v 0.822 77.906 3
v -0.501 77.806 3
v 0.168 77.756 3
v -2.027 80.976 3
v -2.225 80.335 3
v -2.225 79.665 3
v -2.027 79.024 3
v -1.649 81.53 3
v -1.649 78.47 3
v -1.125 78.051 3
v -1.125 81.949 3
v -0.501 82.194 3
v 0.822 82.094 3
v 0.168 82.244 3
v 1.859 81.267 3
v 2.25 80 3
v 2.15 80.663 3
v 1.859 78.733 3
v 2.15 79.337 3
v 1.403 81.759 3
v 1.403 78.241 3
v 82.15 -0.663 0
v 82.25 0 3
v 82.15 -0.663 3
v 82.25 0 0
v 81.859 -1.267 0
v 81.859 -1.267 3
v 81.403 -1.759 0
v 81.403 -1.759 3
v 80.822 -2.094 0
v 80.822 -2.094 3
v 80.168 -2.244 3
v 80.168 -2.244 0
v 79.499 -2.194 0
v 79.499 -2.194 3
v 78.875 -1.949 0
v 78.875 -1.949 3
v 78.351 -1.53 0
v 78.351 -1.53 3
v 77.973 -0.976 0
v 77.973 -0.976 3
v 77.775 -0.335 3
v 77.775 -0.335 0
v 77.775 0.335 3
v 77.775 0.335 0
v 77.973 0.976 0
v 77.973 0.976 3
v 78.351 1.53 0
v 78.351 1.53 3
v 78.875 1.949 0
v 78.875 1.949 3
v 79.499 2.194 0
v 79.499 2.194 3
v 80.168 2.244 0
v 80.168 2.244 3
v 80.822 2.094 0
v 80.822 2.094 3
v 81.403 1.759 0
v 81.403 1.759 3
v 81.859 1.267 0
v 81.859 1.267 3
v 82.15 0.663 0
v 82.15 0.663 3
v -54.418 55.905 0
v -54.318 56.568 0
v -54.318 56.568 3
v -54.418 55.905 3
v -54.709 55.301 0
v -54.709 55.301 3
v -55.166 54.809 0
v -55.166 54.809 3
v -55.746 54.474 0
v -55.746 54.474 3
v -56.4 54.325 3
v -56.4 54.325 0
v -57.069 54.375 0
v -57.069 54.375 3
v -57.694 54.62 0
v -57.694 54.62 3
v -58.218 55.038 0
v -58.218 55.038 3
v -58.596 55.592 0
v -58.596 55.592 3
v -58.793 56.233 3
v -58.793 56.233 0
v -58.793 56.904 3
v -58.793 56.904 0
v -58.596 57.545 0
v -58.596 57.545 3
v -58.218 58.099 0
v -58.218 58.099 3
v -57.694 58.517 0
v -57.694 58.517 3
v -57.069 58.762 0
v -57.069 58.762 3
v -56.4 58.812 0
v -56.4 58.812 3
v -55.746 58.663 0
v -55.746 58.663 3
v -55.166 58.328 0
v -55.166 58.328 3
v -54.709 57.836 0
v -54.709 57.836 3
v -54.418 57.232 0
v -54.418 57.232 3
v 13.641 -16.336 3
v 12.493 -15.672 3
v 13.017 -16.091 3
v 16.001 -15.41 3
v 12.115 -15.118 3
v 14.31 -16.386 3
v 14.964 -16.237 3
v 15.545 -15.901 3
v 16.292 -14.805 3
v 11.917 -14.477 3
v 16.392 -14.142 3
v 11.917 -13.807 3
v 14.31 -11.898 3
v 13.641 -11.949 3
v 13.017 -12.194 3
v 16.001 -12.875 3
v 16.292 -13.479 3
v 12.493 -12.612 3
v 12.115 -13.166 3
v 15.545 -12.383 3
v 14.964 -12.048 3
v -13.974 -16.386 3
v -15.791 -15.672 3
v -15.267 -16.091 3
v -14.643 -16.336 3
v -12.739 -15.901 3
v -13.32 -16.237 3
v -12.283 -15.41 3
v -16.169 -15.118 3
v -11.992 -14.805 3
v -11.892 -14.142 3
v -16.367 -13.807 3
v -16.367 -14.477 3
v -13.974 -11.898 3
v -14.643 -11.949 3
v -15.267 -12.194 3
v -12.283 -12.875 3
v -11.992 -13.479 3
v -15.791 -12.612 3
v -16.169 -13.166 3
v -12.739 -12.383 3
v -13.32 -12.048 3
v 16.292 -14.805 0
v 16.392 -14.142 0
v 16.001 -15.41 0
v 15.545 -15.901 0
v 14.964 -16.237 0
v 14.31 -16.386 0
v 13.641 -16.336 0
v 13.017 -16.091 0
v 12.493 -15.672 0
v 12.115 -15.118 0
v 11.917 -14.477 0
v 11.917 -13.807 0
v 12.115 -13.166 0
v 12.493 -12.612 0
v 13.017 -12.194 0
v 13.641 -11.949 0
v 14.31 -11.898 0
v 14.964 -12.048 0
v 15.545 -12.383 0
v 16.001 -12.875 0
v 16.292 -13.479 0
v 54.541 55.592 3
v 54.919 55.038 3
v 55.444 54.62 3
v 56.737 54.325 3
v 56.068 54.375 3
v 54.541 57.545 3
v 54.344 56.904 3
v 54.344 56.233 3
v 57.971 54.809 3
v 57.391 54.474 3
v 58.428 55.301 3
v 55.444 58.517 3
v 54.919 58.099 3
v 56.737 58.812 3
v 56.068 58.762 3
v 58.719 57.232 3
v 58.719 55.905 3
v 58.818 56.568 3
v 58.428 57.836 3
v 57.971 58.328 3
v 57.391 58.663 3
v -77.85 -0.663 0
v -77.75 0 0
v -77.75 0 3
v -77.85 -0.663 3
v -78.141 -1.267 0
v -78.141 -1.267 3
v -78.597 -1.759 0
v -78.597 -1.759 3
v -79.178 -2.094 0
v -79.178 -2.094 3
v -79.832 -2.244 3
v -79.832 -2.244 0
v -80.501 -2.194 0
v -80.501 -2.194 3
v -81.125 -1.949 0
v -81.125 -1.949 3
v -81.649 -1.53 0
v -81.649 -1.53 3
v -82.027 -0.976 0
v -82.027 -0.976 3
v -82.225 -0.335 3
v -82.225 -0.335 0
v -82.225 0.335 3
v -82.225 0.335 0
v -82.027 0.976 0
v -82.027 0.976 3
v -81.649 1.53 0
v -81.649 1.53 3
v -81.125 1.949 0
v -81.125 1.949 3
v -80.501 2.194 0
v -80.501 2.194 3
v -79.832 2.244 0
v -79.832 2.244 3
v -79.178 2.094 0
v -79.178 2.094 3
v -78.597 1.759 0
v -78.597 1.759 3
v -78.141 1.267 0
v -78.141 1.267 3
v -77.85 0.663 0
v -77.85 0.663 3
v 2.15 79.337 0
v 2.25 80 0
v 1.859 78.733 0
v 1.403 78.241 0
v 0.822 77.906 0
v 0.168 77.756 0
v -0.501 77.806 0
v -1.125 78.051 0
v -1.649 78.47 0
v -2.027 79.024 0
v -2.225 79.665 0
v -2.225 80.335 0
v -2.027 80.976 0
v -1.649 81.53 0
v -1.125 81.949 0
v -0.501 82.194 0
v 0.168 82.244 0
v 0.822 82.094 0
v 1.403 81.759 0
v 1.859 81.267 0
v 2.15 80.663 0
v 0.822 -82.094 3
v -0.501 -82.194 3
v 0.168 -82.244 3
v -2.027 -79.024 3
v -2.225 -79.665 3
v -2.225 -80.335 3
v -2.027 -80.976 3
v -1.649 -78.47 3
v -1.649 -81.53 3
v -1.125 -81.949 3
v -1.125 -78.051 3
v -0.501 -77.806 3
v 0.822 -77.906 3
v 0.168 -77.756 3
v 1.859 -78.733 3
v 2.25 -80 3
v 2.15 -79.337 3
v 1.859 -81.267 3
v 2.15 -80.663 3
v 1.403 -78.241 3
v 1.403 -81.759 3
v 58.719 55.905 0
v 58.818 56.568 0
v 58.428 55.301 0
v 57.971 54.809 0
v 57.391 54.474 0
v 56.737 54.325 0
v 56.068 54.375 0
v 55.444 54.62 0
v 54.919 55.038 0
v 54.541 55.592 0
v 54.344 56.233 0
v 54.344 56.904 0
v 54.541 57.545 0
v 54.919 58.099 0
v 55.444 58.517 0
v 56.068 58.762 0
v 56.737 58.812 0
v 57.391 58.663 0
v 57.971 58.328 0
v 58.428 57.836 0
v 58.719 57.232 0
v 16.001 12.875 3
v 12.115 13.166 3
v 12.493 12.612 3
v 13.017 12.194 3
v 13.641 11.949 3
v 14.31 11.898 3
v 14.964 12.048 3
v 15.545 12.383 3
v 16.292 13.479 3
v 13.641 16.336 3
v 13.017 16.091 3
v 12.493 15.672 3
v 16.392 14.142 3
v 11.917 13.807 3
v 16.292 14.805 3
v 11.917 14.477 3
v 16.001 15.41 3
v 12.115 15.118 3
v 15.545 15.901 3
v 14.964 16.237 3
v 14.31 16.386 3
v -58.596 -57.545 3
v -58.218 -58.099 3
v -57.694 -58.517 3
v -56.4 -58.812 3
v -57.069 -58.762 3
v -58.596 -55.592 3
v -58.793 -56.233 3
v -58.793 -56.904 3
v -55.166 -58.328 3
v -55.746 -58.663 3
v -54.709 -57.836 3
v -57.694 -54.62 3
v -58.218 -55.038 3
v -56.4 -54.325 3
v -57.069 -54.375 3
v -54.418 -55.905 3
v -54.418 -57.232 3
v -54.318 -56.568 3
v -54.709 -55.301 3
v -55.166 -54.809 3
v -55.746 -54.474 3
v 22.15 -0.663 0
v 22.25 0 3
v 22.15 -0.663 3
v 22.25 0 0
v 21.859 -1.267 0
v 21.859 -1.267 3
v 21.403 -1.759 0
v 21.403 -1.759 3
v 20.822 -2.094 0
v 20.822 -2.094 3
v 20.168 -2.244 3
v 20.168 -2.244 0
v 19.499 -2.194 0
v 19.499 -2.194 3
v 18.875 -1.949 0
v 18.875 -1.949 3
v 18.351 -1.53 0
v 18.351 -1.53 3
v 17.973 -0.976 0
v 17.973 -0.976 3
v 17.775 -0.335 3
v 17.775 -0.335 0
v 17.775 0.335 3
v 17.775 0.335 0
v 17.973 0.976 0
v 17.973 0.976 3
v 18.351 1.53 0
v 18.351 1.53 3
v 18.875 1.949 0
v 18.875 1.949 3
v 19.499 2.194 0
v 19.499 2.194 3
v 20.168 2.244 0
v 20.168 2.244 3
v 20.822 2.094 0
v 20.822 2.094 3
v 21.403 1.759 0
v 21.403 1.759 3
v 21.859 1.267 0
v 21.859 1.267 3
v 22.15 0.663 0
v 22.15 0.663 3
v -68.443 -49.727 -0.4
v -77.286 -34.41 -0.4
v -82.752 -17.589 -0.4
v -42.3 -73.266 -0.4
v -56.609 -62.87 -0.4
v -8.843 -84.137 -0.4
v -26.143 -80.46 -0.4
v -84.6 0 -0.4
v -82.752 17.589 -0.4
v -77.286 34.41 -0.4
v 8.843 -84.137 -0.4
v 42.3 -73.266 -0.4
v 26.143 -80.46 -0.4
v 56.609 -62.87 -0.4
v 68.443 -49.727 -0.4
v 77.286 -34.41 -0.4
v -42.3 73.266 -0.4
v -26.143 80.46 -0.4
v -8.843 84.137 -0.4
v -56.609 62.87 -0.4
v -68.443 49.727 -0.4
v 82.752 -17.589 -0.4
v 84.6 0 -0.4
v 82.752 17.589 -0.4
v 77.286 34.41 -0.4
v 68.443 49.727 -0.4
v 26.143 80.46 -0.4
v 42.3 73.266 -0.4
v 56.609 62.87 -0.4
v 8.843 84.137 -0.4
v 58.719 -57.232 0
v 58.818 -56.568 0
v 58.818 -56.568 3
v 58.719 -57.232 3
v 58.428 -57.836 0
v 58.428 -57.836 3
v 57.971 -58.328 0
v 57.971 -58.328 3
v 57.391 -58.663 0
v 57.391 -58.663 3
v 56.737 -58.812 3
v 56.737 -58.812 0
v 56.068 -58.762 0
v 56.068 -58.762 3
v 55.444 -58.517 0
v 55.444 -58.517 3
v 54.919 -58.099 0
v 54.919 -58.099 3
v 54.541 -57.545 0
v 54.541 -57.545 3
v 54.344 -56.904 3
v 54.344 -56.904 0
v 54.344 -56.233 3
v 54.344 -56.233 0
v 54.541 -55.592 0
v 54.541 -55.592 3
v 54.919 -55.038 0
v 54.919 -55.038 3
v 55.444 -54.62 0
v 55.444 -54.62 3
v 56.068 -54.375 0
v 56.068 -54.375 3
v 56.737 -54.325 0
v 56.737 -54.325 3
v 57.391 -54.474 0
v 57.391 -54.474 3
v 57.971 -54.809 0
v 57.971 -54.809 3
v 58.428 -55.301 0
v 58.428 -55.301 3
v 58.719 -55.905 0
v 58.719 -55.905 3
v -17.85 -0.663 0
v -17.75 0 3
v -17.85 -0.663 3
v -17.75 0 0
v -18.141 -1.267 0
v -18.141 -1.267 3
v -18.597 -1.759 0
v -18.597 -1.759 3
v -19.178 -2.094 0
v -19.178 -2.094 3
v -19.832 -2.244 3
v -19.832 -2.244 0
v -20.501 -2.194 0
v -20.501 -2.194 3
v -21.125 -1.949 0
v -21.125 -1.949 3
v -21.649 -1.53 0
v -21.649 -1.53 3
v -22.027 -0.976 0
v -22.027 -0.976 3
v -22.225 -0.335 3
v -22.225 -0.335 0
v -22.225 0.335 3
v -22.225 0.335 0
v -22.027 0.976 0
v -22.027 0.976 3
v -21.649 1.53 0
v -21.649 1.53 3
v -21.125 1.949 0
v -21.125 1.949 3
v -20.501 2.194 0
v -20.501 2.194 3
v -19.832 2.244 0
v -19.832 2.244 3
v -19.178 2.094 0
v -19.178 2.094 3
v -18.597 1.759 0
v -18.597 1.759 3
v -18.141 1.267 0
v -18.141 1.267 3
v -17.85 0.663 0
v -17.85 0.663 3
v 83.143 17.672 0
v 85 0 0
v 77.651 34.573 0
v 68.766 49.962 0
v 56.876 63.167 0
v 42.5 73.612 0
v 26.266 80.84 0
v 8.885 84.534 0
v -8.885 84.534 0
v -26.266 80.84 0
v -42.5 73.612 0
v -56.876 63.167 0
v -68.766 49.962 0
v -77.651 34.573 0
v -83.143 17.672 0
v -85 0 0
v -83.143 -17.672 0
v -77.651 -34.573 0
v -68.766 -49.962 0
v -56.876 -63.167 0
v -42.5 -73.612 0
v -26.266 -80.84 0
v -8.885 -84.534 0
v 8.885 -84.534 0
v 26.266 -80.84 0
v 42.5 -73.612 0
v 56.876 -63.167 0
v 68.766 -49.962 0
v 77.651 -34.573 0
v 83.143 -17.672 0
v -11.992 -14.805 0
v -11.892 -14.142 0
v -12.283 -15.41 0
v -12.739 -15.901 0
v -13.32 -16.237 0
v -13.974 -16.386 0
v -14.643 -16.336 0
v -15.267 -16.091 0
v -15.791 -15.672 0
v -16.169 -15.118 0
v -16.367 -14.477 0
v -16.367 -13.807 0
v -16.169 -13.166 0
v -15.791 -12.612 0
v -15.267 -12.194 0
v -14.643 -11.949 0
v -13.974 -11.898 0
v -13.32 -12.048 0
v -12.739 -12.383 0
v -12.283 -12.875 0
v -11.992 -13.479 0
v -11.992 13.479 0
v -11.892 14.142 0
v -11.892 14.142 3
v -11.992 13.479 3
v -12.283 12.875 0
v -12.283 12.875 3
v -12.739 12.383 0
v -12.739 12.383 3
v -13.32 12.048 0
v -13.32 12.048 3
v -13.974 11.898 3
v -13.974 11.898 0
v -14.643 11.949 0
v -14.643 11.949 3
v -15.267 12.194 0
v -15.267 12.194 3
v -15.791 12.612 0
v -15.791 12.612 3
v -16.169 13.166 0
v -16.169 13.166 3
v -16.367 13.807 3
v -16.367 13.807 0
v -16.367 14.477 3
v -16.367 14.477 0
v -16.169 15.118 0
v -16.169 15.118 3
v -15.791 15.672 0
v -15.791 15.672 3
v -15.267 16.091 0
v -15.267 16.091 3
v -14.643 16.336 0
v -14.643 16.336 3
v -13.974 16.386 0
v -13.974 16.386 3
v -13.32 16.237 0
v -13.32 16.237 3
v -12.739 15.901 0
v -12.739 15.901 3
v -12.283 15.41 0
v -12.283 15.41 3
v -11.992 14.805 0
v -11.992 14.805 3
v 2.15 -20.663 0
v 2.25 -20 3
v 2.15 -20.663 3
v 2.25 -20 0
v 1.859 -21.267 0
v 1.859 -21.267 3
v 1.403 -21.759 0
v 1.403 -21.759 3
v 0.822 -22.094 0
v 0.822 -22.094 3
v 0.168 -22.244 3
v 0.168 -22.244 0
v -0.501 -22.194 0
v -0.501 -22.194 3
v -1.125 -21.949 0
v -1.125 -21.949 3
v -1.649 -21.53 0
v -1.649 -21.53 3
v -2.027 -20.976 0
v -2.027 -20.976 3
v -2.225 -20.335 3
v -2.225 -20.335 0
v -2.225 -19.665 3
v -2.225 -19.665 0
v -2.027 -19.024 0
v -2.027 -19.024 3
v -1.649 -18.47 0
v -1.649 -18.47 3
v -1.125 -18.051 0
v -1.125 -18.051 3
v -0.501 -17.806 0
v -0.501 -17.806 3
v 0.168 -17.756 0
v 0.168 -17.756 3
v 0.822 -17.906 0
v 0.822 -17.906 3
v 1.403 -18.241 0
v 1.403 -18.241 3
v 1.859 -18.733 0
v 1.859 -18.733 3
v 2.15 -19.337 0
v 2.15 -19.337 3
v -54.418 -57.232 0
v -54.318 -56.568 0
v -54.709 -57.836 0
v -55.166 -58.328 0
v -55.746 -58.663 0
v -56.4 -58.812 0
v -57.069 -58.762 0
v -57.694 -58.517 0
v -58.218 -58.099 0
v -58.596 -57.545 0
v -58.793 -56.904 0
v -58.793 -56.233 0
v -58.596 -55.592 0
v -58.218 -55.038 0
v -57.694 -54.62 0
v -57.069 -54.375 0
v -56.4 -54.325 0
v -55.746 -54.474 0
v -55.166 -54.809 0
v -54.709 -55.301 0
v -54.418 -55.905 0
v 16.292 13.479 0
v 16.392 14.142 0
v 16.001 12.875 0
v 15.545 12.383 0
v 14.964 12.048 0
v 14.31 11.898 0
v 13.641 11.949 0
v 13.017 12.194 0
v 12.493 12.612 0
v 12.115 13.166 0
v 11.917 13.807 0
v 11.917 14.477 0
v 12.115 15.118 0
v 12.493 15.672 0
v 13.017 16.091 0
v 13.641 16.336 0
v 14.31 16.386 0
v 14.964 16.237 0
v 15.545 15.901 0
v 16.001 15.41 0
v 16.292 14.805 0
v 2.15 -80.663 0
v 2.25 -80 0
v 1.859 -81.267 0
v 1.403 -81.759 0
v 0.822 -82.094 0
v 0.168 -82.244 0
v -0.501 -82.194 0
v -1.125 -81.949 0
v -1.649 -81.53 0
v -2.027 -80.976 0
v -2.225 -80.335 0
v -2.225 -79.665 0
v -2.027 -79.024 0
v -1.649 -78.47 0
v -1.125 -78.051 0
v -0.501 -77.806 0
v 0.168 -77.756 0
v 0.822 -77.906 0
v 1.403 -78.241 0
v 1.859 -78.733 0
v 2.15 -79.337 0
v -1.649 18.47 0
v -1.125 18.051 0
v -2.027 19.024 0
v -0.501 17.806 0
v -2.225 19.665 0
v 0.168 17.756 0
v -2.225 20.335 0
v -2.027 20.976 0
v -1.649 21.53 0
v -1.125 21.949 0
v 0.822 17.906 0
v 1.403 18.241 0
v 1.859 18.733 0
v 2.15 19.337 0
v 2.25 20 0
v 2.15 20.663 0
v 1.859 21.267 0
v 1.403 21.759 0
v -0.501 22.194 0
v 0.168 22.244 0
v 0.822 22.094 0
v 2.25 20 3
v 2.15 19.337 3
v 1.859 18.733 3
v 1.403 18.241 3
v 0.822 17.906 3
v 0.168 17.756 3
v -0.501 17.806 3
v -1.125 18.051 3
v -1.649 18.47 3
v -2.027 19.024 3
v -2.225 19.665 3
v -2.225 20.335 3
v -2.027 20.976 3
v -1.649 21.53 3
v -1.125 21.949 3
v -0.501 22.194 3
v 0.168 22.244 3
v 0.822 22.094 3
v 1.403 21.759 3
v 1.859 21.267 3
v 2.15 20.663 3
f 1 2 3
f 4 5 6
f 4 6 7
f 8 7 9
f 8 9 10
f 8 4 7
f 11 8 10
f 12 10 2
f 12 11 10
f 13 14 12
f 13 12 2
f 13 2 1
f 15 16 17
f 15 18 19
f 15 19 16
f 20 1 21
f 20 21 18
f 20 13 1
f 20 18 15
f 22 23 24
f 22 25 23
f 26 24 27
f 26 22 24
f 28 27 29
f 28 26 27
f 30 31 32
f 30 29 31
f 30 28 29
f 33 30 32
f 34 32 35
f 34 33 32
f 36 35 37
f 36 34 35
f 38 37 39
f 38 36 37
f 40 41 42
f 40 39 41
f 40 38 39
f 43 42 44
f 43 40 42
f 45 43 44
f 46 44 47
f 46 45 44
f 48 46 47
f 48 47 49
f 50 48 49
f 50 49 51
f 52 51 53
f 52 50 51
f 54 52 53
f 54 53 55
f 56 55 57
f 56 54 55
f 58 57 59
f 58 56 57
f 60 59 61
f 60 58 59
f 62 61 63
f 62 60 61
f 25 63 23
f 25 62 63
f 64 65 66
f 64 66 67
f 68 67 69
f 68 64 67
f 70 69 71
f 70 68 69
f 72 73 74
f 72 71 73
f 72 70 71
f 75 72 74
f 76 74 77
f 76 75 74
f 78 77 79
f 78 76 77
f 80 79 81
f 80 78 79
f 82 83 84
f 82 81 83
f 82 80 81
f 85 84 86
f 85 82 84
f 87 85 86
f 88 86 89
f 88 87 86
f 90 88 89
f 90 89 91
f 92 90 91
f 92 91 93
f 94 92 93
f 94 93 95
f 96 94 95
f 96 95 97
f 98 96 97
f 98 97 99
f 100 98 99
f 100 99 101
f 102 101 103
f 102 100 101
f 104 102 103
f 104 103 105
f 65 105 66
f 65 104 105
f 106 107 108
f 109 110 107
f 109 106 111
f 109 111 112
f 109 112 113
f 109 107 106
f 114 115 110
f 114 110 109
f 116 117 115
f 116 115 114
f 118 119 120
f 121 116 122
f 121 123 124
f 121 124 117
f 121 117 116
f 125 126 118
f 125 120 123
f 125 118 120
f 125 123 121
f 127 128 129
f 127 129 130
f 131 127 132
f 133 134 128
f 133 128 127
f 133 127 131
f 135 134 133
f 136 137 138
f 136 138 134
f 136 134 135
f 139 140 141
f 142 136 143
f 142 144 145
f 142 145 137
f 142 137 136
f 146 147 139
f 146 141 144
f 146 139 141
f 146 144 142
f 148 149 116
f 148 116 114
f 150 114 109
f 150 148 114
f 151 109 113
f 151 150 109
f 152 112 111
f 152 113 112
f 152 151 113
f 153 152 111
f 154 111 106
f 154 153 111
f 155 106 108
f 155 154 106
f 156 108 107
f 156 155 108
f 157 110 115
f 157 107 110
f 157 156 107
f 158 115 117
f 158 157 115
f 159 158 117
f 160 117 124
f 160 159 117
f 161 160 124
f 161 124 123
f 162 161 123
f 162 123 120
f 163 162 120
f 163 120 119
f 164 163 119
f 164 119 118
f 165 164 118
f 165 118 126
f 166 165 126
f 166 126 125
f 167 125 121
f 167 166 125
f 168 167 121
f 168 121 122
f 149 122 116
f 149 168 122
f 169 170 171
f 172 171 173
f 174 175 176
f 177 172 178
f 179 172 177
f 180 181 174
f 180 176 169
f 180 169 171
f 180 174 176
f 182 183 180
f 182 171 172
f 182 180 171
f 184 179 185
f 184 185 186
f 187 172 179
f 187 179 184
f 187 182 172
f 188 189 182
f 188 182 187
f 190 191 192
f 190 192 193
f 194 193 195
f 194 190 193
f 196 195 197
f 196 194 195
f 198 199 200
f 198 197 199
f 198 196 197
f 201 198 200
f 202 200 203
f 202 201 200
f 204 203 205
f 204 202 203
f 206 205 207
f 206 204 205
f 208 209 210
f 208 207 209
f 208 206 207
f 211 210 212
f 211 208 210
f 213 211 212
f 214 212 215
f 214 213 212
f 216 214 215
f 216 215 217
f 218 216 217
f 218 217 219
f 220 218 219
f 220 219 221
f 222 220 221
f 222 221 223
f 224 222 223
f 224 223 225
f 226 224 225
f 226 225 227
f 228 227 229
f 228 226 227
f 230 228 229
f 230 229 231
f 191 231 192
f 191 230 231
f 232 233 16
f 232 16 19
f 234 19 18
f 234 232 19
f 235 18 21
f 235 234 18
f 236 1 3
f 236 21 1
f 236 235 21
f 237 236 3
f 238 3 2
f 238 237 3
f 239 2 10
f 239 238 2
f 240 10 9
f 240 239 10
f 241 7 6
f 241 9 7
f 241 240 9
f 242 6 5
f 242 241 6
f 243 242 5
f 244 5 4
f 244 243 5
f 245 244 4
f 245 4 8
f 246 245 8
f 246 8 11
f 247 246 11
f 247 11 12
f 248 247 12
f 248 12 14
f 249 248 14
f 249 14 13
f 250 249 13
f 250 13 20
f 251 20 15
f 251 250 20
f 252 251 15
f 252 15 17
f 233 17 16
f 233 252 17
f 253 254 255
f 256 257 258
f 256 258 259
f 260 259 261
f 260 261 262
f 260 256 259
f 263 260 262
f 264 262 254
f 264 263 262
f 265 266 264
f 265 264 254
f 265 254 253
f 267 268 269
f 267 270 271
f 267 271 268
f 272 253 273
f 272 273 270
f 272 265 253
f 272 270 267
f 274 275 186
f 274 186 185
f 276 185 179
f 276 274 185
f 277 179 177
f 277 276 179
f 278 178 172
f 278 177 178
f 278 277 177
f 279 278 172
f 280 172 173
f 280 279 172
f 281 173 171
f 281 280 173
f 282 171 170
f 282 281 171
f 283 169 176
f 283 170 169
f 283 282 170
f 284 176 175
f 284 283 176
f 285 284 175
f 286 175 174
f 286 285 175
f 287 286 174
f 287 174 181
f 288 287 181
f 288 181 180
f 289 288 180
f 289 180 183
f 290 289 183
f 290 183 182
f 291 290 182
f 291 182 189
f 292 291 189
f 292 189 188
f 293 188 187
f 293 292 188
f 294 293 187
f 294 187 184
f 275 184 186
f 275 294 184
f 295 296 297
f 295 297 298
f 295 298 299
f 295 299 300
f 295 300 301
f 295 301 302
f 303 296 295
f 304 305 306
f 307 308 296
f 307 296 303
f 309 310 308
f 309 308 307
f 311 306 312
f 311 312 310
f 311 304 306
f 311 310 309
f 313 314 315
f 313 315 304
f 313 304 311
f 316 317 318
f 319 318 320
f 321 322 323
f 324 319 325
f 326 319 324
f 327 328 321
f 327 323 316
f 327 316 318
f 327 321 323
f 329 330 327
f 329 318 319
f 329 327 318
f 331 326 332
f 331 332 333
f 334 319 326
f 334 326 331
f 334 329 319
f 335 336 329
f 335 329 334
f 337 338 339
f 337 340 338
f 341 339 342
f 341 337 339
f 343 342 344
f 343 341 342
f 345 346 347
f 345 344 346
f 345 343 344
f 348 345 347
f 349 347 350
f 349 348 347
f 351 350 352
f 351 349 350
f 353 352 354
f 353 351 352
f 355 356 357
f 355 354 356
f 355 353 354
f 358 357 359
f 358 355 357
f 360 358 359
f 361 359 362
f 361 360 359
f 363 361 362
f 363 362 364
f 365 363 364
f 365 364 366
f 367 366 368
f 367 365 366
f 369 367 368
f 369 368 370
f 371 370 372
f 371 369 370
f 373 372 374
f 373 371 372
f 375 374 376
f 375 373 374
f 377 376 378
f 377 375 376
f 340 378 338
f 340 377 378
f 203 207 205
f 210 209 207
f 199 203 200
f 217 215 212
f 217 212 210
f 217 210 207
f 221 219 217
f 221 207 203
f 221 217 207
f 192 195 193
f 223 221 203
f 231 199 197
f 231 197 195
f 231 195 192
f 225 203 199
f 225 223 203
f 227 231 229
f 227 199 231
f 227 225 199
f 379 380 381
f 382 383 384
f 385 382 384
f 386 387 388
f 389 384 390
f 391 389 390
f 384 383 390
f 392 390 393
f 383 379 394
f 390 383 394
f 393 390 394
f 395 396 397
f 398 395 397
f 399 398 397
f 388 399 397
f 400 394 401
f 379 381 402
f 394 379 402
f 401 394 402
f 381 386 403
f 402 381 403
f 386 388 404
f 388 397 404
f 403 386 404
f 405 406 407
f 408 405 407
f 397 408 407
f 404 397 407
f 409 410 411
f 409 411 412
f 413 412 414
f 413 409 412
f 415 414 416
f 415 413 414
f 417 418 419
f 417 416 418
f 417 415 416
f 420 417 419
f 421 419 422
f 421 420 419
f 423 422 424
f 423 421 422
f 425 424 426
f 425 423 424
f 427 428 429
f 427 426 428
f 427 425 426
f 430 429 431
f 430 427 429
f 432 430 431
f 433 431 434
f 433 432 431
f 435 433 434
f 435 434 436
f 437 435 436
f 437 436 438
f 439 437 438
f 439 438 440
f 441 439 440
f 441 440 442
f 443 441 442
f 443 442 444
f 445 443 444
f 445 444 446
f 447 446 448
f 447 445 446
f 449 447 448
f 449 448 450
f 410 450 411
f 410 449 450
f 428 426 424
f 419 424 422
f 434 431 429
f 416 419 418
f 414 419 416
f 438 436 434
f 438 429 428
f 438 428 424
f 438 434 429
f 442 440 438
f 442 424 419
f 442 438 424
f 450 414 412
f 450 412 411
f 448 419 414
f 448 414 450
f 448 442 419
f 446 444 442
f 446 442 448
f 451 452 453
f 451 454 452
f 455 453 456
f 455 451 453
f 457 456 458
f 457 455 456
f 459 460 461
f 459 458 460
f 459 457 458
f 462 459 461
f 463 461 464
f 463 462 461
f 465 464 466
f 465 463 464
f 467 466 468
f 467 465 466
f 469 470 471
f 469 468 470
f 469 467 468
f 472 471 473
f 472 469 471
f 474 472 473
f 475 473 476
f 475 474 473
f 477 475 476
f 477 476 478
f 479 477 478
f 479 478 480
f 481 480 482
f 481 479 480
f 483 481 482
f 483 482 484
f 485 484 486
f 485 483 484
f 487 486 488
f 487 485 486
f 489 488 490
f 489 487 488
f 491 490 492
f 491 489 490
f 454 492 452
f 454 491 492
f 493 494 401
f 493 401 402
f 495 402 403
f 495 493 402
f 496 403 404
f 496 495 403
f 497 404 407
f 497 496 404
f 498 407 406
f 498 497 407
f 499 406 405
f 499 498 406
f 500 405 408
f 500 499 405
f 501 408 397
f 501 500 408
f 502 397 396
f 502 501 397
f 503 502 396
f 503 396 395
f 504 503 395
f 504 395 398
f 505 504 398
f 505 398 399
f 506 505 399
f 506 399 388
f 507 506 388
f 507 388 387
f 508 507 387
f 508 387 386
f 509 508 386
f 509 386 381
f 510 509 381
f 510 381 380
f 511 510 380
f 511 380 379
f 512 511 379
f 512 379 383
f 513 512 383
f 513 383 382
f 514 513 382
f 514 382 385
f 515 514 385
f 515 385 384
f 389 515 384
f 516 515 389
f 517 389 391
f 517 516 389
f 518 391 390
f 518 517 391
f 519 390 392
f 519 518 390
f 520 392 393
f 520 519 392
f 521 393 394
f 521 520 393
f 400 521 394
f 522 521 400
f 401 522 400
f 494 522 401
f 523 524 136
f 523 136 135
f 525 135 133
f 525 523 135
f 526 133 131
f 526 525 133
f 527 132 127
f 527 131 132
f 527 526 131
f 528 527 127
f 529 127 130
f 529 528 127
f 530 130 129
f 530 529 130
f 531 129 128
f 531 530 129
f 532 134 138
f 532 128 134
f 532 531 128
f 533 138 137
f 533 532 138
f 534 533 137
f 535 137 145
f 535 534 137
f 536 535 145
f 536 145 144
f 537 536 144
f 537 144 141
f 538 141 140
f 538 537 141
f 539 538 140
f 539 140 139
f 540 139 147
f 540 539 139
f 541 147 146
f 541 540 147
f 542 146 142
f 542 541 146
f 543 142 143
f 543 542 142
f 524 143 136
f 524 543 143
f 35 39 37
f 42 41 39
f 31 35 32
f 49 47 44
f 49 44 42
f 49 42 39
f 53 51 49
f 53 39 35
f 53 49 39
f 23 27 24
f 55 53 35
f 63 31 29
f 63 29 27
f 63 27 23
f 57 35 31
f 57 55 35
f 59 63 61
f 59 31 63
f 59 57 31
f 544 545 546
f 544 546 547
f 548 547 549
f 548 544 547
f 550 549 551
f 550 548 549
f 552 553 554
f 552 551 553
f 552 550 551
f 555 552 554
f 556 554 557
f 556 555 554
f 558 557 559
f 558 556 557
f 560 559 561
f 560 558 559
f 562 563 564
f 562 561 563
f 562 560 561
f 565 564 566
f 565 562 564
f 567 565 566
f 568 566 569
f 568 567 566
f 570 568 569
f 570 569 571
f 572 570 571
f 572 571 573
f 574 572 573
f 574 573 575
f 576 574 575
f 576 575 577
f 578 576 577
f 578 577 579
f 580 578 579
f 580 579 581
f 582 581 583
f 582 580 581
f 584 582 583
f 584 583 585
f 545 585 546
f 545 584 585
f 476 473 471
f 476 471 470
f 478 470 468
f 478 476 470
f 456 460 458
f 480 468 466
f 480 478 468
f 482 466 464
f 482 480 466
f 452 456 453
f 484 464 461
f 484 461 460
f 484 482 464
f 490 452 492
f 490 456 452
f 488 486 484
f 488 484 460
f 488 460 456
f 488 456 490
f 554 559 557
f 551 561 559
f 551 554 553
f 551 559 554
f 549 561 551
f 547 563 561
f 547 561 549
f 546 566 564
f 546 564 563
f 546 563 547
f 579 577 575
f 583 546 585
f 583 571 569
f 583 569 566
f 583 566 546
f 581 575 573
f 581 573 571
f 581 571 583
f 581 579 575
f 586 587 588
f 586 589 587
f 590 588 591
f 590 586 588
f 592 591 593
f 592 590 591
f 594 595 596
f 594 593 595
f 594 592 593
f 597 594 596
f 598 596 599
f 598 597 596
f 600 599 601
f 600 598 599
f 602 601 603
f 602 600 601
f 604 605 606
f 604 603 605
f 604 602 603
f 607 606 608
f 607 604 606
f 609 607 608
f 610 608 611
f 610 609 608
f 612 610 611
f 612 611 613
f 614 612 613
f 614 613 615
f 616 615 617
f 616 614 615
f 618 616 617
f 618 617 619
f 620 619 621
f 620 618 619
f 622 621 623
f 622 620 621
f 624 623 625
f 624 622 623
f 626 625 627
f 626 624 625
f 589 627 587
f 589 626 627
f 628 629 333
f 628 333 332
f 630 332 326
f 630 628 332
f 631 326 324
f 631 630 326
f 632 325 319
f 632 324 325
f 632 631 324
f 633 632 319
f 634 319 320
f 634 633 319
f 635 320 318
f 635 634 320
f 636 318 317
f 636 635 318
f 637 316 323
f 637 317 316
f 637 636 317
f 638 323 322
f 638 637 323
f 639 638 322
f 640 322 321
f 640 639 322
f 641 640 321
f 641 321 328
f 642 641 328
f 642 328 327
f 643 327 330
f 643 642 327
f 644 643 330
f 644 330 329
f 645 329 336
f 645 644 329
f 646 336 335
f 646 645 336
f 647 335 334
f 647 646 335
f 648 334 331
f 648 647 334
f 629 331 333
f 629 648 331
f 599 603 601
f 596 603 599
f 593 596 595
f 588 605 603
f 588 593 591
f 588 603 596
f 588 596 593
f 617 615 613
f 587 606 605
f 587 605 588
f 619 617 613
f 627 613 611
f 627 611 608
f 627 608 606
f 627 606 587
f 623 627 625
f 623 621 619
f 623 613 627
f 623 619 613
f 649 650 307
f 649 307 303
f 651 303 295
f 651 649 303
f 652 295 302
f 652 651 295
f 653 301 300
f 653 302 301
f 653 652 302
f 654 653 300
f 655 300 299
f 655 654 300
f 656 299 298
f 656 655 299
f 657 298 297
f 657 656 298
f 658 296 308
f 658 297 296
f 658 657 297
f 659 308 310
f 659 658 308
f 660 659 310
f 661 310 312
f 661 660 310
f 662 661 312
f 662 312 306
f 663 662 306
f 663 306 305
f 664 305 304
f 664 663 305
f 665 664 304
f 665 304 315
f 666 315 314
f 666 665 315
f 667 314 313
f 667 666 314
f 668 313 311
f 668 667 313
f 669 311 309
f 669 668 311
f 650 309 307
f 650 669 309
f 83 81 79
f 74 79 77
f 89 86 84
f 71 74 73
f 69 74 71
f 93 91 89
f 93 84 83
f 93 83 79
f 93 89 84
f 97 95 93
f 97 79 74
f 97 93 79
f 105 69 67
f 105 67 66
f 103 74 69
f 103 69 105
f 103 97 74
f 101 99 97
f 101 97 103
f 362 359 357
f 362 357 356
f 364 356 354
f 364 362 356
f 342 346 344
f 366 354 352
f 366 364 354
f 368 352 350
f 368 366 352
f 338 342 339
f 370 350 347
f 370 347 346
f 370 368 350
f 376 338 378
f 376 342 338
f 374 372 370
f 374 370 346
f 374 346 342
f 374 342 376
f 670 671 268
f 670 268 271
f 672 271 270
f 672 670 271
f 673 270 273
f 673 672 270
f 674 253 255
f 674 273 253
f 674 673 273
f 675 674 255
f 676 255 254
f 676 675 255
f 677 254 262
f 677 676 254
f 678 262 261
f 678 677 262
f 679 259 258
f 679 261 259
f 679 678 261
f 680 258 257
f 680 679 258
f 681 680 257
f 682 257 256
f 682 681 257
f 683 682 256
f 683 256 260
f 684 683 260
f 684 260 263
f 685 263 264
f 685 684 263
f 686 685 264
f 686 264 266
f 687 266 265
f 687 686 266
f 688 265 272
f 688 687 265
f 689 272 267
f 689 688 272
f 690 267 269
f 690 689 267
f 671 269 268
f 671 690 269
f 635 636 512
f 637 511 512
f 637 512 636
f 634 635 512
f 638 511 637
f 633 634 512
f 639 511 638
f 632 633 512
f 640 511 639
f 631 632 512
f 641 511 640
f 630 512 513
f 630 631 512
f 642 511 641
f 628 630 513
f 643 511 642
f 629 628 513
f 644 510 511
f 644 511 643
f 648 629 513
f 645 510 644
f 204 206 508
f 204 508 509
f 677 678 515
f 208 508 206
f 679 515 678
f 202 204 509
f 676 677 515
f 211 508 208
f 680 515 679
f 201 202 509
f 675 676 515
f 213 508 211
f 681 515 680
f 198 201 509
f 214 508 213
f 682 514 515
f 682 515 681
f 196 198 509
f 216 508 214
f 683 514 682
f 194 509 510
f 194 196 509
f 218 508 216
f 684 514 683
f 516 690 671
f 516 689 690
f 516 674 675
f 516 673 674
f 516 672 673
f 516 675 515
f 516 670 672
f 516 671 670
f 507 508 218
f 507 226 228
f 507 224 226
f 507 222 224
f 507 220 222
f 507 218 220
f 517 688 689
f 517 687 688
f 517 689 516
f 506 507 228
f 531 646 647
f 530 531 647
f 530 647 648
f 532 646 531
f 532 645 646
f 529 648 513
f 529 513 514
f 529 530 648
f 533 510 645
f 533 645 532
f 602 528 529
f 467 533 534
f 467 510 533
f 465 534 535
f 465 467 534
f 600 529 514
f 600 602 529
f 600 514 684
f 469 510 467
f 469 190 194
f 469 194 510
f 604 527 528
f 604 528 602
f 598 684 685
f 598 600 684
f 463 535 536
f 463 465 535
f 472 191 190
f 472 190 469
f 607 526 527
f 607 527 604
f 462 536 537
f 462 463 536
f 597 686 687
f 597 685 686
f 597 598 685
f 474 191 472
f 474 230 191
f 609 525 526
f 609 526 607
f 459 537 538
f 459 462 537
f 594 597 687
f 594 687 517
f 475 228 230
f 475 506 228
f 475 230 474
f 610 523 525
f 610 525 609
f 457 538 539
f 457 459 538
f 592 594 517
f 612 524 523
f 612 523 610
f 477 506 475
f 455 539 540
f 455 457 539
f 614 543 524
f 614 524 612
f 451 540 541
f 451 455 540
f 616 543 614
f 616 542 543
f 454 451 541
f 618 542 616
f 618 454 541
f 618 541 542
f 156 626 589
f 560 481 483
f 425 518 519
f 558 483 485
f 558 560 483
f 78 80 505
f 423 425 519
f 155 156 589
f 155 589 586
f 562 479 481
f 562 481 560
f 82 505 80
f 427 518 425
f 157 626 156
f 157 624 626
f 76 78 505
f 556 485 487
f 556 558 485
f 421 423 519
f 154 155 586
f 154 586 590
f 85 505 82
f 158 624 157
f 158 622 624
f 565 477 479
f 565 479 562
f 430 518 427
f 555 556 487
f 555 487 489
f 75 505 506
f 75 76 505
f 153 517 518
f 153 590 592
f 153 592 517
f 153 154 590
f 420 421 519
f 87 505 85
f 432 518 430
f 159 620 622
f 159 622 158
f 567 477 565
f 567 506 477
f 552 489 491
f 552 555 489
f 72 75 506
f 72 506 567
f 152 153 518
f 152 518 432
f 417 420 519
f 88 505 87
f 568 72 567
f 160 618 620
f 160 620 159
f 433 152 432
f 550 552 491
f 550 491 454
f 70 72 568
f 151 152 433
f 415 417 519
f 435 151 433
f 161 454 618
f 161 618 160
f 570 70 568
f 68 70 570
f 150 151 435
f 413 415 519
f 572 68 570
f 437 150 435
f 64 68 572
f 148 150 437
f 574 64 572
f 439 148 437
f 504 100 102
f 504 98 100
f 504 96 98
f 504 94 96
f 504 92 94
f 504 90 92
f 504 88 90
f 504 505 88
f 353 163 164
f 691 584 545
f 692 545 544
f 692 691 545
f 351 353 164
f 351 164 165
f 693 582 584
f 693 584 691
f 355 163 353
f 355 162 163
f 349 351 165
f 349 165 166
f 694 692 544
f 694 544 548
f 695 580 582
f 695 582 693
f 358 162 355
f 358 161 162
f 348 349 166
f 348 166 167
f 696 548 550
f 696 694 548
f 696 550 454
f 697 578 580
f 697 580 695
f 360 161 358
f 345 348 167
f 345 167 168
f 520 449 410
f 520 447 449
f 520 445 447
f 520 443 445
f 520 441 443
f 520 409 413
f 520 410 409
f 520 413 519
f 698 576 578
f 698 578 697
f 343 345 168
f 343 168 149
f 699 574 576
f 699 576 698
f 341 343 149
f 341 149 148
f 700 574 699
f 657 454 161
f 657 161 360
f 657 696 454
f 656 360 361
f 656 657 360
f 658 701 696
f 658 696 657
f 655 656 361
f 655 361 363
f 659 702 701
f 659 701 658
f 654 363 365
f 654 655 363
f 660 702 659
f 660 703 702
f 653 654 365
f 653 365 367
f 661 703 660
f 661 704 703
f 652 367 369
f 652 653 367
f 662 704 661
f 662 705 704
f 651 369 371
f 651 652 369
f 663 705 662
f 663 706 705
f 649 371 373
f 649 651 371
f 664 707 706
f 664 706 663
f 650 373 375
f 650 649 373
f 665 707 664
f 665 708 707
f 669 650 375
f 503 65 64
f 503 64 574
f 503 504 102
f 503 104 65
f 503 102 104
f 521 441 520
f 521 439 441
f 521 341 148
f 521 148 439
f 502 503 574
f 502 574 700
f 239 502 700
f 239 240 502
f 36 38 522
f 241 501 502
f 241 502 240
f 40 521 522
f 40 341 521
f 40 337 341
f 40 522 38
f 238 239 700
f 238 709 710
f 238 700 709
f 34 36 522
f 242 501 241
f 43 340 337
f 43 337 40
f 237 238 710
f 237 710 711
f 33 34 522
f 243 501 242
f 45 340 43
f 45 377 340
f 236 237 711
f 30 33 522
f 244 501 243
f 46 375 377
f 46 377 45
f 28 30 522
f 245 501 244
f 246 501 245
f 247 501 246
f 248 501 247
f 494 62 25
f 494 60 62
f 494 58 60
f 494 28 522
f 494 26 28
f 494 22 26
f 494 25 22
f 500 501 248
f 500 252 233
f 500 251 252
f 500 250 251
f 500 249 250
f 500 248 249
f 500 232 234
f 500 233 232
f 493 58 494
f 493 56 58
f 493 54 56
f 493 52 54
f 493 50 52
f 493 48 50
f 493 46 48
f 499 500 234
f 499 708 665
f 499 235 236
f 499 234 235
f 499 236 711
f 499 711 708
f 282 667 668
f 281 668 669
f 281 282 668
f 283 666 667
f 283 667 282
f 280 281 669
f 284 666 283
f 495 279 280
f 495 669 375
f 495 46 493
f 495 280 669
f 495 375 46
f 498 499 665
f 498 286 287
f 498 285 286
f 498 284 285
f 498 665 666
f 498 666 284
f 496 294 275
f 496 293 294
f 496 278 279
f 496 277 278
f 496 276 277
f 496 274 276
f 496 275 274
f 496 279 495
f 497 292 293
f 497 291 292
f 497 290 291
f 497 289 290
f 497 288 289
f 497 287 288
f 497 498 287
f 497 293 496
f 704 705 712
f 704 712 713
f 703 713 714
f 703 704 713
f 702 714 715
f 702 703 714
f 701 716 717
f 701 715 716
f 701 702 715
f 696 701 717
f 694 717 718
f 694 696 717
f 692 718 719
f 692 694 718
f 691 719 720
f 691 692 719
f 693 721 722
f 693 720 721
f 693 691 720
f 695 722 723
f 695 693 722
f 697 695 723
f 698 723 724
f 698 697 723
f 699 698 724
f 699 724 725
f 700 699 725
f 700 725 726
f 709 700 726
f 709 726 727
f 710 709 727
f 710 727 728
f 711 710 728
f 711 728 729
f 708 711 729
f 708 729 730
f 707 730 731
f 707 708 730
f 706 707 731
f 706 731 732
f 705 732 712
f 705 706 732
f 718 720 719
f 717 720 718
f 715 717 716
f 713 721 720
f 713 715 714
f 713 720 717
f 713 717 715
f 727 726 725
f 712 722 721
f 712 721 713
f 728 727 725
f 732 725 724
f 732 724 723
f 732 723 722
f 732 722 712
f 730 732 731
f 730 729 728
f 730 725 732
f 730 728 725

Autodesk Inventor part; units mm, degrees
ref_plane "YZ Plane" through (0, 0, 0) normal (1, 0, 0) x (0, 1, 0)
ref_plane "XZ Plane" through (0, 0, 0) normal (0, 1, 0) x (-1, 0, 0)
ref_plane "XY Plane" through (0, 0, 0) normal (0, 0, 1) x (1, 0, 0)
sketch "Sketch1" plane through (0, 0, 0) normal (0, 0, 1) x (1, 0, 0)
  circle A0 centre (20, 0) radius 2.25
  circle A1 centre (80, 0) radius 2.25
  circle A2 centre (0, 0) radius 85
  line L0 (0, 0) -> (20, 0) construction
  line L1 (20, 0) -> (80, 0) construction
  circle A3 centre (14.1421, 14.1421) radius 2.25
  circle A4 centre (56.5685, 56.5685) radius 2.25
  line L2 (0, 0) -> (14.1421, 14.1421) construction
  line L3 (14.1421, 14.1421) -> (56.5685, 56.5685) construction
  circle A5 centre (0, 20) radius 2.25
  circle A6 centre (0, 80) radius 2.25
  line L4 (0, 0) -> (0, 20) construction
  line L5 (0, 20) -> (0, 80) construction
  circle A7 centre (-14.1421, 14.1421) radius 2.25
  circle A8 centre (-56.5685, 56.5685) radius 2.25
  line L6 (0, 0) -> (-14.1421, 14.1421) construction
  line L7 (-14.1421, 14.1421) -> (-56.5685, 56.5685) construction
  circle A9 centre (-20, 0) radius 2.25
  circle A10 centre (-80, 0) radius 2.25
  line L8 (0, 0) -> (-20, 0) construction
  line L9 (-20, 0) -> (-80, 0) construction
  circle A11 centre (-14.1421, -14.1421) radius 2.25
  circle A12 centre (-56.5685, -56.5685) radius 2.25
  line L10 (0, 0) -> (-14.1421, -14.1421) construction
  line L11 (-14.1421, -14.1421) -> (-56.5685, -56.5685) construction
  circle A13 centre (0, -20) radius 2.25
  circle A14 centre (0, -80) radius 2.25
  line L12 (0, 0) -> (0, -20) construction
  line L13 (0, -20) -> (0, -80) construction
  circle A15 centre (14.1421, -14.1421) radius 2.25
  circle A16 centre (56.5685, -56.5685) radius 2.25
  line L14 (0, 0) -> (14.1421, -14.1421) construction
  line L15 (14.1421, -14.1421) -> (56.5685, -56.5685) construction
  dimension "d0" = 170
  dimension "d1" = 20
  dimension "d2" = 80
  dimension "d3" = 4.5
  dimension "d6" = 360
extrude "Extrusion1" add sketch "Sketch1" against normal blind 0.4 contours A0 | A1 | A2 | A3 | A4 | A5 | A6 | A7 | A8 | A9 | A10 | A11 | A12 | A13 | A14 | A15 | A16
extrude "Extrusion2" add sketch "Sketch1" along normal blind 3 contours A0 | A1 | A3 | A4 | A5 | A6 | A7 | A8 | A9 | A10 | A11 | A12 | A13 | A14 | A15 | A16
chamfer "Chamfer1" distance 0.4 angle 45 1 edges at (-85, 0, -0.4)
properties part number "Deskcap"
